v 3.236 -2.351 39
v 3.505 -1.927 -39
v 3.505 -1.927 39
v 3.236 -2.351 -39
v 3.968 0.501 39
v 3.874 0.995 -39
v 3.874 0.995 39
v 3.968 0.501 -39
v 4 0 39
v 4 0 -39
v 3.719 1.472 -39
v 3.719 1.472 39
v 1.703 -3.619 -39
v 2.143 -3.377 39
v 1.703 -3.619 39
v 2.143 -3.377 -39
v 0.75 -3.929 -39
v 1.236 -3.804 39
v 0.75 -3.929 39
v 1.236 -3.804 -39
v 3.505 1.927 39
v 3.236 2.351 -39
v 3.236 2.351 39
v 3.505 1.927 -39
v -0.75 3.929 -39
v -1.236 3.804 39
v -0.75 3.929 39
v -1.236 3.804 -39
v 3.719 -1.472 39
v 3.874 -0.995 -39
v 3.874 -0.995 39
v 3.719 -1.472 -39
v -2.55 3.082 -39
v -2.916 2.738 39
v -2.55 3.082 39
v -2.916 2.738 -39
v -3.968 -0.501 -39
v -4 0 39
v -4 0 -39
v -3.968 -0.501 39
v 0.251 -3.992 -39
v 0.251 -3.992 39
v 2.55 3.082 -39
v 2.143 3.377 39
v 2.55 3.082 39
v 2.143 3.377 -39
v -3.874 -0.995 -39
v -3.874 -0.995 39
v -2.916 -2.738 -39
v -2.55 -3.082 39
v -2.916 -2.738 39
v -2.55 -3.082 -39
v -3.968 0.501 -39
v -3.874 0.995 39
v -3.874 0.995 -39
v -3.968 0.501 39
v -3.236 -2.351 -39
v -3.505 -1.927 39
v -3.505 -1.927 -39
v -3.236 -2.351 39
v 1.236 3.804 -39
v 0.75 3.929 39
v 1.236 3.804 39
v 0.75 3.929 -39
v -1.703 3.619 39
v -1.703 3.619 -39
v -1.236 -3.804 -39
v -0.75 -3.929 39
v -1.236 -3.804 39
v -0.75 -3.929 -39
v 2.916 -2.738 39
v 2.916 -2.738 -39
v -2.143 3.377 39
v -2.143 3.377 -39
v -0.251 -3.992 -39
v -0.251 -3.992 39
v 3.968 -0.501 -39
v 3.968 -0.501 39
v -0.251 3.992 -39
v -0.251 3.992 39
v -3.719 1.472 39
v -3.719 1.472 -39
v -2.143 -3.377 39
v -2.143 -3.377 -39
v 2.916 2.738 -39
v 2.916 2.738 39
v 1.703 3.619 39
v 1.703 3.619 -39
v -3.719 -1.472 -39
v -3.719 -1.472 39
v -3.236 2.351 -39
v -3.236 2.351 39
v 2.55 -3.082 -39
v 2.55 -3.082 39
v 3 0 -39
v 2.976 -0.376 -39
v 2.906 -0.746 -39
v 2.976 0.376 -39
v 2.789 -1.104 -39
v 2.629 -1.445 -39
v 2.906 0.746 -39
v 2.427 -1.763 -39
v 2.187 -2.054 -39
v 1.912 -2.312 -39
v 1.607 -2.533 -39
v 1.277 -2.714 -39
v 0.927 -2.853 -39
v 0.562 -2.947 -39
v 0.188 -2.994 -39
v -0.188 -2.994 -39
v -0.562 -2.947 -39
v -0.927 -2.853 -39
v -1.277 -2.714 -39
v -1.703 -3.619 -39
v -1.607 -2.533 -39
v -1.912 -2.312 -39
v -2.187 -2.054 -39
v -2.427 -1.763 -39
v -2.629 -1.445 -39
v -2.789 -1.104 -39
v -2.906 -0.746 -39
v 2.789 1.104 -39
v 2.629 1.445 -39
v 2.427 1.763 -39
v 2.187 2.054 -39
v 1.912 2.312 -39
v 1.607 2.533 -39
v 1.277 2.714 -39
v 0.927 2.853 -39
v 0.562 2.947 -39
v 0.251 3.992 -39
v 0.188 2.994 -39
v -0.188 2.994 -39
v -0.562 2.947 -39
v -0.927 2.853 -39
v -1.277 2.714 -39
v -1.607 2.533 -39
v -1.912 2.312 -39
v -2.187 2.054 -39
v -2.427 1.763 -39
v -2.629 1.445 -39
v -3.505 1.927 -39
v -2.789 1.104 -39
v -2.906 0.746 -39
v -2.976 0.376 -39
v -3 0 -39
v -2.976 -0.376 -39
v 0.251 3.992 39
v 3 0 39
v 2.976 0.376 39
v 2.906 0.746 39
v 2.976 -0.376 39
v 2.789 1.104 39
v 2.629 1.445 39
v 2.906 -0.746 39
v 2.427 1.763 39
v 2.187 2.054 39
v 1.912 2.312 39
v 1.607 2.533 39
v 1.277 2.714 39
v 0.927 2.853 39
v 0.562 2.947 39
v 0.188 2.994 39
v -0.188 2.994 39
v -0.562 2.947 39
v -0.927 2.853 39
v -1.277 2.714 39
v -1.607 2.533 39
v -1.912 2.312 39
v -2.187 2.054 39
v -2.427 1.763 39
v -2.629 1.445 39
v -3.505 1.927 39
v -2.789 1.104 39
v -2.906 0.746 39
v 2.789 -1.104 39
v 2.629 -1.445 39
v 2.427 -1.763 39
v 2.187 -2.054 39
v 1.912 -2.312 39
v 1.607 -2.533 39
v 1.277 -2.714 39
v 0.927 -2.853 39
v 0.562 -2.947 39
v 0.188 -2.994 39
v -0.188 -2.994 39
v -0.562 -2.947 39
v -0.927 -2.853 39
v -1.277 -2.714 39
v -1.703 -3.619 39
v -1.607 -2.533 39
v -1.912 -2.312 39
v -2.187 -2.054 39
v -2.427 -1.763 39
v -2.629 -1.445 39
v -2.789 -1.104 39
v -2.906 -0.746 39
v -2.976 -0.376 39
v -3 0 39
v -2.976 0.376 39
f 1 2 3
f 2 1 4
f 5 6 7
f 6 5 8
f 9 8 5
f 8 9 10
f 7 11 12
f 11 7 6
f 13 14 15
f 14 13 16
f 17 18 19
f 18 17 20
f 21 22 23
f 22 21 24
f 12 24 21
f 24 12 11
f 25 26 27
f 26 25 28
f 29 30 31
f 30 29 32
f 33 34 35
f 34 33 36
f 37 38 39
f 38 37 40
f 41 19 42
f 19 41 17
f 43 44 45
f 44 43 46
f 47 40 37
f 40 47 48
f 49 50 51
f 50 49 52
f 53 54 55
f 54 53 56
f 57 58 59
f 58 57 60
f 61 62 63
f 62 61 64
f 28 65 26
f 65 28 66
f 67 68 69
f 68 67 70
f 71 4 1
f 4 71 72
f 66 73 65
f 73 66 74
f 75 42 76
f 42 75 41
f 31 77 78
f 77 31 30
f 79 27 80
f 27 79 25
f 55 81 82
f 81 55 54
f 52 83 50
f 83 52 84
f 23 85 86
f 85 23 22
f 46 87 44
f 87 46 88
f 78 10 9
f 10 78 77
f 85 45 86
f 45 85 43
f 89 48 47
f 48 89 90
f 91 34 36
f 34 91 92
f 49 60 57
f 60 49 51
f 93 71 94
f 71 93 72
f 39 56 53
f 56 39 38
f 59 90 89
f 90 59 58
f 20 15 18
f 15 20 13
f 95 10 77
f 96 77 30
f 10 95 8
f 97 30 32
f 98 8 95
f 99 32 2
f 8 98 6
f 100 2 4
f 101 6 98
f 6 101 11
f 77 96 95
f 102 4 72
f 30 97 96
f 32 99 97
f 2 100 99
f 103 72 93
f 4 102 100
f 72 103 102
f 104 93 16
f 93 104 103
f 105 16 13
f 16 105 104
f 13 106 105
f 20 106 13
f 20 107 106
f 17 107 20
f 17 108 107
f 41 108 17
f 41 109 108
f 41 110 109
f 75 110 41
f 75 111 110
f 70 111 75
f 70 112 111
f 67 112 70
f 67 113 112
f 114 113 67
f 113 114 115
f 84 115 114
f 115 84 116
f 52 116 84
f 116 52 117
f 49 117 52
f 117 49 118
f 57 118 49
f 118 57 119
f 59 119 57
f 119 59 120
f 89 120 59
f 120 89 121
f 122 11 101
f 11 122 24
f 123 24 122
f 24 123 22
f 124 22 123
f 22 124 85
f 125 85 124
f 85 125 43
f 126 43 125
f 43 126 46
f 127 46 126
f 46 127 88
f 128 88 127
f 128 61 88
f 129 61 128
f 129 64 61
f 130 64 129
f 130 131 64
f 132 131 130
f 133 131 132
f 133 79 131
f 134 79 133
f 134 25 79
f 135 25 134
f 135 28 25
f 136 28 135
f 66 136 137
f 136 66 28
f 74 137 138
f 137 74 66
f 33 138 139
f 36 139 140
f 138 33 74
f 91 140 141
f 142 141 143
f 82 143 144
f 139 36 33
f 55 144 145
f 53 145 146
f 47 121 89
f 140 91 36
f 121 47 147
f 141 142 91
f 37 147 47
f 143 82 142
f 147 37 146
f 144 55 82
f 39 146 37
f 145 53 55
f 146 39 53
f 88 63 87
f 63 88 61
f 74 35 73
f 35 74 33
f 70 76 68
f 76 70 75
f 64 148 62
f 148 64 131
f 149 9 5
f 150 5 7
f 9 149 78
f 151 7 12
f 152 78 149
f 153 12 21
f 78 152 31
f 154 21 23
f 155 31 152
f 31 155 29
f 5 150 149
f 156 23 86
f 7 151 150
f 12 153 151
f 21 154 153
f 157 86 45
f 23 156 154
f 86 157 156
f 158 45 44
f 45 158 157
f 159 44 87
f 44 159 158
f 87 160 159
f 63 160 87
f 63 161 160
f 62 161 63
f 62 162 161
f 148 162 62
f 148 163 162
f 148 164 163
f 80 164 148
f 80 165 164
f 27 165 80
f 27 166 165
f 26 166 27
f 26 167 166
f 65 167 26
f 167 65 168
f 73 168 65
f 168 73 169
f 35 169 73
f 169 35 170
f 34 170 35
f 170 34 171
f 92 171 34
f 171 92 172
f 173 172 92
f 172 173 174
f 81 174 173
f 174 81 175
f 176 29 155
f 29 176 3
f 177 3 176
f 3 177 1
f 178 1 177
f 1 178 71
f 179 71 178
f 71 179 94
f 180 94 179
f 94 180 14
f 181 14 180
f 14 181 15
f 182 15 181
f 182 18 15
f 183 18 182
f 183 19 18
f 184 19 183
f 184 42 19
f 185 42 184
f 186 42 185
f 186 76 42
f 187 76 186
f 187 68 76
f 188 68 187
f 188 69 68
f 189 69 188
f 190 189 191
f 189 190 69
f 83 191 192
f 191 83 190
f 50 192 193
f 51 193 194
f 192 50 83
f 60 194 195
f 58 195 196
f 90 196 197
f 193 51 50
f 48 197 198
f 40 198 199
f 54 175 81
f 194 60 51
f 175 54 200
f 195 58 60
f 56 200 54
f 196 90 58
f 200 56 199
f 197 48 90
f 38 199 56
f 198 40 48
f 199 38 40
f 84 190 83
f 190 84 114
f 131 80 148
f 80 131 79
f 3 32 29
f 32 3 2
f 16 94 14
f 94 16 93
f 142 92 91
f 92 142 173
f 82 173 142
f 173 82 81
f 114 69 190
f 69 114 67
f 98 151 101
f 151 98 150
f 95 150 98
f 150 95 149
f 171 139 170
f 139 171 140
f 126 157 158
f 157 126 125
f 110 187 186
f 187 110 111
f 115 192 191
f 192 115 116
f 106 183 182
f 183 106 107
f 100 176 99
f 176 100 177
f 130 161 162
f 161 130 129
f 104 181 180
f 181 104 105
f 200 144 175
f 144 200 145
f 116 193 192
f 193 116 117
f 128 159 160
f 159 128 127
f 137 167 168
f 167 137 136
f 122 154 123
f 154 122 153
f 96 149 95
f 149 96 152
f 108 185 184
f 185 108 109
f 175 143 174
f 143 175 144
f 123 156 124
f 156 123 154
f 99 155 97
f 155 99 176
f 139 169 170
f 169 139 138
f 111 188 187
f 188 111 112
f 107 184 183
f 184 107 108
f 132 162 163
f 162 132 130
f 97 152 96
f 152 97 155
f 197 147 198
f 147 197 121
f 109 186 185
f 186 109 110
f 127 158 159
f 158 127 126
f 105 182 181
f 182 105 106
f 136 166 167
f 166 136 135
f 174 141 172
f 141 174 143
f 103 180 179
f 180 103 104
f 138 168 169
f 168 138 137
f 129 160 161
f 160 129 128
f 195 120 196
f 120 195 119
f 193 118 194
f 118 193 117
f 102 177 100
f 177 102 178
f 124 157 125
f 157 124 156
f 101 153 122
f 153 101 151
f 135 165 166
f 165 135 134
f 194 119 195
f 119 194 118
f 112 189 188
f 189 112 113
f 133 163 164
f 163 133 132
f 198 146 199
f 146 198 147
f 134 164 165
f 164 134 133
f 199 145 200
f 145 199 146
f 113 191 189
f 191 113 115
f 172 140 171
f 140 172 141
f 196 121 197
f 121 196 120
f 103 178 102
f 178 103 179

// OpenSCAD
$fn = 50;


difference() {
	union() {
		translate(v = [0, 0, -39.0000000000]) {
			cylinder(h = 78, r = 4.0000000000);
		}
	}
	union() {
		translate(v = [0, 0, -100.0000000000]) {
			cylinder(h = 200, r = 3.0000000000);
		}
	}
}
